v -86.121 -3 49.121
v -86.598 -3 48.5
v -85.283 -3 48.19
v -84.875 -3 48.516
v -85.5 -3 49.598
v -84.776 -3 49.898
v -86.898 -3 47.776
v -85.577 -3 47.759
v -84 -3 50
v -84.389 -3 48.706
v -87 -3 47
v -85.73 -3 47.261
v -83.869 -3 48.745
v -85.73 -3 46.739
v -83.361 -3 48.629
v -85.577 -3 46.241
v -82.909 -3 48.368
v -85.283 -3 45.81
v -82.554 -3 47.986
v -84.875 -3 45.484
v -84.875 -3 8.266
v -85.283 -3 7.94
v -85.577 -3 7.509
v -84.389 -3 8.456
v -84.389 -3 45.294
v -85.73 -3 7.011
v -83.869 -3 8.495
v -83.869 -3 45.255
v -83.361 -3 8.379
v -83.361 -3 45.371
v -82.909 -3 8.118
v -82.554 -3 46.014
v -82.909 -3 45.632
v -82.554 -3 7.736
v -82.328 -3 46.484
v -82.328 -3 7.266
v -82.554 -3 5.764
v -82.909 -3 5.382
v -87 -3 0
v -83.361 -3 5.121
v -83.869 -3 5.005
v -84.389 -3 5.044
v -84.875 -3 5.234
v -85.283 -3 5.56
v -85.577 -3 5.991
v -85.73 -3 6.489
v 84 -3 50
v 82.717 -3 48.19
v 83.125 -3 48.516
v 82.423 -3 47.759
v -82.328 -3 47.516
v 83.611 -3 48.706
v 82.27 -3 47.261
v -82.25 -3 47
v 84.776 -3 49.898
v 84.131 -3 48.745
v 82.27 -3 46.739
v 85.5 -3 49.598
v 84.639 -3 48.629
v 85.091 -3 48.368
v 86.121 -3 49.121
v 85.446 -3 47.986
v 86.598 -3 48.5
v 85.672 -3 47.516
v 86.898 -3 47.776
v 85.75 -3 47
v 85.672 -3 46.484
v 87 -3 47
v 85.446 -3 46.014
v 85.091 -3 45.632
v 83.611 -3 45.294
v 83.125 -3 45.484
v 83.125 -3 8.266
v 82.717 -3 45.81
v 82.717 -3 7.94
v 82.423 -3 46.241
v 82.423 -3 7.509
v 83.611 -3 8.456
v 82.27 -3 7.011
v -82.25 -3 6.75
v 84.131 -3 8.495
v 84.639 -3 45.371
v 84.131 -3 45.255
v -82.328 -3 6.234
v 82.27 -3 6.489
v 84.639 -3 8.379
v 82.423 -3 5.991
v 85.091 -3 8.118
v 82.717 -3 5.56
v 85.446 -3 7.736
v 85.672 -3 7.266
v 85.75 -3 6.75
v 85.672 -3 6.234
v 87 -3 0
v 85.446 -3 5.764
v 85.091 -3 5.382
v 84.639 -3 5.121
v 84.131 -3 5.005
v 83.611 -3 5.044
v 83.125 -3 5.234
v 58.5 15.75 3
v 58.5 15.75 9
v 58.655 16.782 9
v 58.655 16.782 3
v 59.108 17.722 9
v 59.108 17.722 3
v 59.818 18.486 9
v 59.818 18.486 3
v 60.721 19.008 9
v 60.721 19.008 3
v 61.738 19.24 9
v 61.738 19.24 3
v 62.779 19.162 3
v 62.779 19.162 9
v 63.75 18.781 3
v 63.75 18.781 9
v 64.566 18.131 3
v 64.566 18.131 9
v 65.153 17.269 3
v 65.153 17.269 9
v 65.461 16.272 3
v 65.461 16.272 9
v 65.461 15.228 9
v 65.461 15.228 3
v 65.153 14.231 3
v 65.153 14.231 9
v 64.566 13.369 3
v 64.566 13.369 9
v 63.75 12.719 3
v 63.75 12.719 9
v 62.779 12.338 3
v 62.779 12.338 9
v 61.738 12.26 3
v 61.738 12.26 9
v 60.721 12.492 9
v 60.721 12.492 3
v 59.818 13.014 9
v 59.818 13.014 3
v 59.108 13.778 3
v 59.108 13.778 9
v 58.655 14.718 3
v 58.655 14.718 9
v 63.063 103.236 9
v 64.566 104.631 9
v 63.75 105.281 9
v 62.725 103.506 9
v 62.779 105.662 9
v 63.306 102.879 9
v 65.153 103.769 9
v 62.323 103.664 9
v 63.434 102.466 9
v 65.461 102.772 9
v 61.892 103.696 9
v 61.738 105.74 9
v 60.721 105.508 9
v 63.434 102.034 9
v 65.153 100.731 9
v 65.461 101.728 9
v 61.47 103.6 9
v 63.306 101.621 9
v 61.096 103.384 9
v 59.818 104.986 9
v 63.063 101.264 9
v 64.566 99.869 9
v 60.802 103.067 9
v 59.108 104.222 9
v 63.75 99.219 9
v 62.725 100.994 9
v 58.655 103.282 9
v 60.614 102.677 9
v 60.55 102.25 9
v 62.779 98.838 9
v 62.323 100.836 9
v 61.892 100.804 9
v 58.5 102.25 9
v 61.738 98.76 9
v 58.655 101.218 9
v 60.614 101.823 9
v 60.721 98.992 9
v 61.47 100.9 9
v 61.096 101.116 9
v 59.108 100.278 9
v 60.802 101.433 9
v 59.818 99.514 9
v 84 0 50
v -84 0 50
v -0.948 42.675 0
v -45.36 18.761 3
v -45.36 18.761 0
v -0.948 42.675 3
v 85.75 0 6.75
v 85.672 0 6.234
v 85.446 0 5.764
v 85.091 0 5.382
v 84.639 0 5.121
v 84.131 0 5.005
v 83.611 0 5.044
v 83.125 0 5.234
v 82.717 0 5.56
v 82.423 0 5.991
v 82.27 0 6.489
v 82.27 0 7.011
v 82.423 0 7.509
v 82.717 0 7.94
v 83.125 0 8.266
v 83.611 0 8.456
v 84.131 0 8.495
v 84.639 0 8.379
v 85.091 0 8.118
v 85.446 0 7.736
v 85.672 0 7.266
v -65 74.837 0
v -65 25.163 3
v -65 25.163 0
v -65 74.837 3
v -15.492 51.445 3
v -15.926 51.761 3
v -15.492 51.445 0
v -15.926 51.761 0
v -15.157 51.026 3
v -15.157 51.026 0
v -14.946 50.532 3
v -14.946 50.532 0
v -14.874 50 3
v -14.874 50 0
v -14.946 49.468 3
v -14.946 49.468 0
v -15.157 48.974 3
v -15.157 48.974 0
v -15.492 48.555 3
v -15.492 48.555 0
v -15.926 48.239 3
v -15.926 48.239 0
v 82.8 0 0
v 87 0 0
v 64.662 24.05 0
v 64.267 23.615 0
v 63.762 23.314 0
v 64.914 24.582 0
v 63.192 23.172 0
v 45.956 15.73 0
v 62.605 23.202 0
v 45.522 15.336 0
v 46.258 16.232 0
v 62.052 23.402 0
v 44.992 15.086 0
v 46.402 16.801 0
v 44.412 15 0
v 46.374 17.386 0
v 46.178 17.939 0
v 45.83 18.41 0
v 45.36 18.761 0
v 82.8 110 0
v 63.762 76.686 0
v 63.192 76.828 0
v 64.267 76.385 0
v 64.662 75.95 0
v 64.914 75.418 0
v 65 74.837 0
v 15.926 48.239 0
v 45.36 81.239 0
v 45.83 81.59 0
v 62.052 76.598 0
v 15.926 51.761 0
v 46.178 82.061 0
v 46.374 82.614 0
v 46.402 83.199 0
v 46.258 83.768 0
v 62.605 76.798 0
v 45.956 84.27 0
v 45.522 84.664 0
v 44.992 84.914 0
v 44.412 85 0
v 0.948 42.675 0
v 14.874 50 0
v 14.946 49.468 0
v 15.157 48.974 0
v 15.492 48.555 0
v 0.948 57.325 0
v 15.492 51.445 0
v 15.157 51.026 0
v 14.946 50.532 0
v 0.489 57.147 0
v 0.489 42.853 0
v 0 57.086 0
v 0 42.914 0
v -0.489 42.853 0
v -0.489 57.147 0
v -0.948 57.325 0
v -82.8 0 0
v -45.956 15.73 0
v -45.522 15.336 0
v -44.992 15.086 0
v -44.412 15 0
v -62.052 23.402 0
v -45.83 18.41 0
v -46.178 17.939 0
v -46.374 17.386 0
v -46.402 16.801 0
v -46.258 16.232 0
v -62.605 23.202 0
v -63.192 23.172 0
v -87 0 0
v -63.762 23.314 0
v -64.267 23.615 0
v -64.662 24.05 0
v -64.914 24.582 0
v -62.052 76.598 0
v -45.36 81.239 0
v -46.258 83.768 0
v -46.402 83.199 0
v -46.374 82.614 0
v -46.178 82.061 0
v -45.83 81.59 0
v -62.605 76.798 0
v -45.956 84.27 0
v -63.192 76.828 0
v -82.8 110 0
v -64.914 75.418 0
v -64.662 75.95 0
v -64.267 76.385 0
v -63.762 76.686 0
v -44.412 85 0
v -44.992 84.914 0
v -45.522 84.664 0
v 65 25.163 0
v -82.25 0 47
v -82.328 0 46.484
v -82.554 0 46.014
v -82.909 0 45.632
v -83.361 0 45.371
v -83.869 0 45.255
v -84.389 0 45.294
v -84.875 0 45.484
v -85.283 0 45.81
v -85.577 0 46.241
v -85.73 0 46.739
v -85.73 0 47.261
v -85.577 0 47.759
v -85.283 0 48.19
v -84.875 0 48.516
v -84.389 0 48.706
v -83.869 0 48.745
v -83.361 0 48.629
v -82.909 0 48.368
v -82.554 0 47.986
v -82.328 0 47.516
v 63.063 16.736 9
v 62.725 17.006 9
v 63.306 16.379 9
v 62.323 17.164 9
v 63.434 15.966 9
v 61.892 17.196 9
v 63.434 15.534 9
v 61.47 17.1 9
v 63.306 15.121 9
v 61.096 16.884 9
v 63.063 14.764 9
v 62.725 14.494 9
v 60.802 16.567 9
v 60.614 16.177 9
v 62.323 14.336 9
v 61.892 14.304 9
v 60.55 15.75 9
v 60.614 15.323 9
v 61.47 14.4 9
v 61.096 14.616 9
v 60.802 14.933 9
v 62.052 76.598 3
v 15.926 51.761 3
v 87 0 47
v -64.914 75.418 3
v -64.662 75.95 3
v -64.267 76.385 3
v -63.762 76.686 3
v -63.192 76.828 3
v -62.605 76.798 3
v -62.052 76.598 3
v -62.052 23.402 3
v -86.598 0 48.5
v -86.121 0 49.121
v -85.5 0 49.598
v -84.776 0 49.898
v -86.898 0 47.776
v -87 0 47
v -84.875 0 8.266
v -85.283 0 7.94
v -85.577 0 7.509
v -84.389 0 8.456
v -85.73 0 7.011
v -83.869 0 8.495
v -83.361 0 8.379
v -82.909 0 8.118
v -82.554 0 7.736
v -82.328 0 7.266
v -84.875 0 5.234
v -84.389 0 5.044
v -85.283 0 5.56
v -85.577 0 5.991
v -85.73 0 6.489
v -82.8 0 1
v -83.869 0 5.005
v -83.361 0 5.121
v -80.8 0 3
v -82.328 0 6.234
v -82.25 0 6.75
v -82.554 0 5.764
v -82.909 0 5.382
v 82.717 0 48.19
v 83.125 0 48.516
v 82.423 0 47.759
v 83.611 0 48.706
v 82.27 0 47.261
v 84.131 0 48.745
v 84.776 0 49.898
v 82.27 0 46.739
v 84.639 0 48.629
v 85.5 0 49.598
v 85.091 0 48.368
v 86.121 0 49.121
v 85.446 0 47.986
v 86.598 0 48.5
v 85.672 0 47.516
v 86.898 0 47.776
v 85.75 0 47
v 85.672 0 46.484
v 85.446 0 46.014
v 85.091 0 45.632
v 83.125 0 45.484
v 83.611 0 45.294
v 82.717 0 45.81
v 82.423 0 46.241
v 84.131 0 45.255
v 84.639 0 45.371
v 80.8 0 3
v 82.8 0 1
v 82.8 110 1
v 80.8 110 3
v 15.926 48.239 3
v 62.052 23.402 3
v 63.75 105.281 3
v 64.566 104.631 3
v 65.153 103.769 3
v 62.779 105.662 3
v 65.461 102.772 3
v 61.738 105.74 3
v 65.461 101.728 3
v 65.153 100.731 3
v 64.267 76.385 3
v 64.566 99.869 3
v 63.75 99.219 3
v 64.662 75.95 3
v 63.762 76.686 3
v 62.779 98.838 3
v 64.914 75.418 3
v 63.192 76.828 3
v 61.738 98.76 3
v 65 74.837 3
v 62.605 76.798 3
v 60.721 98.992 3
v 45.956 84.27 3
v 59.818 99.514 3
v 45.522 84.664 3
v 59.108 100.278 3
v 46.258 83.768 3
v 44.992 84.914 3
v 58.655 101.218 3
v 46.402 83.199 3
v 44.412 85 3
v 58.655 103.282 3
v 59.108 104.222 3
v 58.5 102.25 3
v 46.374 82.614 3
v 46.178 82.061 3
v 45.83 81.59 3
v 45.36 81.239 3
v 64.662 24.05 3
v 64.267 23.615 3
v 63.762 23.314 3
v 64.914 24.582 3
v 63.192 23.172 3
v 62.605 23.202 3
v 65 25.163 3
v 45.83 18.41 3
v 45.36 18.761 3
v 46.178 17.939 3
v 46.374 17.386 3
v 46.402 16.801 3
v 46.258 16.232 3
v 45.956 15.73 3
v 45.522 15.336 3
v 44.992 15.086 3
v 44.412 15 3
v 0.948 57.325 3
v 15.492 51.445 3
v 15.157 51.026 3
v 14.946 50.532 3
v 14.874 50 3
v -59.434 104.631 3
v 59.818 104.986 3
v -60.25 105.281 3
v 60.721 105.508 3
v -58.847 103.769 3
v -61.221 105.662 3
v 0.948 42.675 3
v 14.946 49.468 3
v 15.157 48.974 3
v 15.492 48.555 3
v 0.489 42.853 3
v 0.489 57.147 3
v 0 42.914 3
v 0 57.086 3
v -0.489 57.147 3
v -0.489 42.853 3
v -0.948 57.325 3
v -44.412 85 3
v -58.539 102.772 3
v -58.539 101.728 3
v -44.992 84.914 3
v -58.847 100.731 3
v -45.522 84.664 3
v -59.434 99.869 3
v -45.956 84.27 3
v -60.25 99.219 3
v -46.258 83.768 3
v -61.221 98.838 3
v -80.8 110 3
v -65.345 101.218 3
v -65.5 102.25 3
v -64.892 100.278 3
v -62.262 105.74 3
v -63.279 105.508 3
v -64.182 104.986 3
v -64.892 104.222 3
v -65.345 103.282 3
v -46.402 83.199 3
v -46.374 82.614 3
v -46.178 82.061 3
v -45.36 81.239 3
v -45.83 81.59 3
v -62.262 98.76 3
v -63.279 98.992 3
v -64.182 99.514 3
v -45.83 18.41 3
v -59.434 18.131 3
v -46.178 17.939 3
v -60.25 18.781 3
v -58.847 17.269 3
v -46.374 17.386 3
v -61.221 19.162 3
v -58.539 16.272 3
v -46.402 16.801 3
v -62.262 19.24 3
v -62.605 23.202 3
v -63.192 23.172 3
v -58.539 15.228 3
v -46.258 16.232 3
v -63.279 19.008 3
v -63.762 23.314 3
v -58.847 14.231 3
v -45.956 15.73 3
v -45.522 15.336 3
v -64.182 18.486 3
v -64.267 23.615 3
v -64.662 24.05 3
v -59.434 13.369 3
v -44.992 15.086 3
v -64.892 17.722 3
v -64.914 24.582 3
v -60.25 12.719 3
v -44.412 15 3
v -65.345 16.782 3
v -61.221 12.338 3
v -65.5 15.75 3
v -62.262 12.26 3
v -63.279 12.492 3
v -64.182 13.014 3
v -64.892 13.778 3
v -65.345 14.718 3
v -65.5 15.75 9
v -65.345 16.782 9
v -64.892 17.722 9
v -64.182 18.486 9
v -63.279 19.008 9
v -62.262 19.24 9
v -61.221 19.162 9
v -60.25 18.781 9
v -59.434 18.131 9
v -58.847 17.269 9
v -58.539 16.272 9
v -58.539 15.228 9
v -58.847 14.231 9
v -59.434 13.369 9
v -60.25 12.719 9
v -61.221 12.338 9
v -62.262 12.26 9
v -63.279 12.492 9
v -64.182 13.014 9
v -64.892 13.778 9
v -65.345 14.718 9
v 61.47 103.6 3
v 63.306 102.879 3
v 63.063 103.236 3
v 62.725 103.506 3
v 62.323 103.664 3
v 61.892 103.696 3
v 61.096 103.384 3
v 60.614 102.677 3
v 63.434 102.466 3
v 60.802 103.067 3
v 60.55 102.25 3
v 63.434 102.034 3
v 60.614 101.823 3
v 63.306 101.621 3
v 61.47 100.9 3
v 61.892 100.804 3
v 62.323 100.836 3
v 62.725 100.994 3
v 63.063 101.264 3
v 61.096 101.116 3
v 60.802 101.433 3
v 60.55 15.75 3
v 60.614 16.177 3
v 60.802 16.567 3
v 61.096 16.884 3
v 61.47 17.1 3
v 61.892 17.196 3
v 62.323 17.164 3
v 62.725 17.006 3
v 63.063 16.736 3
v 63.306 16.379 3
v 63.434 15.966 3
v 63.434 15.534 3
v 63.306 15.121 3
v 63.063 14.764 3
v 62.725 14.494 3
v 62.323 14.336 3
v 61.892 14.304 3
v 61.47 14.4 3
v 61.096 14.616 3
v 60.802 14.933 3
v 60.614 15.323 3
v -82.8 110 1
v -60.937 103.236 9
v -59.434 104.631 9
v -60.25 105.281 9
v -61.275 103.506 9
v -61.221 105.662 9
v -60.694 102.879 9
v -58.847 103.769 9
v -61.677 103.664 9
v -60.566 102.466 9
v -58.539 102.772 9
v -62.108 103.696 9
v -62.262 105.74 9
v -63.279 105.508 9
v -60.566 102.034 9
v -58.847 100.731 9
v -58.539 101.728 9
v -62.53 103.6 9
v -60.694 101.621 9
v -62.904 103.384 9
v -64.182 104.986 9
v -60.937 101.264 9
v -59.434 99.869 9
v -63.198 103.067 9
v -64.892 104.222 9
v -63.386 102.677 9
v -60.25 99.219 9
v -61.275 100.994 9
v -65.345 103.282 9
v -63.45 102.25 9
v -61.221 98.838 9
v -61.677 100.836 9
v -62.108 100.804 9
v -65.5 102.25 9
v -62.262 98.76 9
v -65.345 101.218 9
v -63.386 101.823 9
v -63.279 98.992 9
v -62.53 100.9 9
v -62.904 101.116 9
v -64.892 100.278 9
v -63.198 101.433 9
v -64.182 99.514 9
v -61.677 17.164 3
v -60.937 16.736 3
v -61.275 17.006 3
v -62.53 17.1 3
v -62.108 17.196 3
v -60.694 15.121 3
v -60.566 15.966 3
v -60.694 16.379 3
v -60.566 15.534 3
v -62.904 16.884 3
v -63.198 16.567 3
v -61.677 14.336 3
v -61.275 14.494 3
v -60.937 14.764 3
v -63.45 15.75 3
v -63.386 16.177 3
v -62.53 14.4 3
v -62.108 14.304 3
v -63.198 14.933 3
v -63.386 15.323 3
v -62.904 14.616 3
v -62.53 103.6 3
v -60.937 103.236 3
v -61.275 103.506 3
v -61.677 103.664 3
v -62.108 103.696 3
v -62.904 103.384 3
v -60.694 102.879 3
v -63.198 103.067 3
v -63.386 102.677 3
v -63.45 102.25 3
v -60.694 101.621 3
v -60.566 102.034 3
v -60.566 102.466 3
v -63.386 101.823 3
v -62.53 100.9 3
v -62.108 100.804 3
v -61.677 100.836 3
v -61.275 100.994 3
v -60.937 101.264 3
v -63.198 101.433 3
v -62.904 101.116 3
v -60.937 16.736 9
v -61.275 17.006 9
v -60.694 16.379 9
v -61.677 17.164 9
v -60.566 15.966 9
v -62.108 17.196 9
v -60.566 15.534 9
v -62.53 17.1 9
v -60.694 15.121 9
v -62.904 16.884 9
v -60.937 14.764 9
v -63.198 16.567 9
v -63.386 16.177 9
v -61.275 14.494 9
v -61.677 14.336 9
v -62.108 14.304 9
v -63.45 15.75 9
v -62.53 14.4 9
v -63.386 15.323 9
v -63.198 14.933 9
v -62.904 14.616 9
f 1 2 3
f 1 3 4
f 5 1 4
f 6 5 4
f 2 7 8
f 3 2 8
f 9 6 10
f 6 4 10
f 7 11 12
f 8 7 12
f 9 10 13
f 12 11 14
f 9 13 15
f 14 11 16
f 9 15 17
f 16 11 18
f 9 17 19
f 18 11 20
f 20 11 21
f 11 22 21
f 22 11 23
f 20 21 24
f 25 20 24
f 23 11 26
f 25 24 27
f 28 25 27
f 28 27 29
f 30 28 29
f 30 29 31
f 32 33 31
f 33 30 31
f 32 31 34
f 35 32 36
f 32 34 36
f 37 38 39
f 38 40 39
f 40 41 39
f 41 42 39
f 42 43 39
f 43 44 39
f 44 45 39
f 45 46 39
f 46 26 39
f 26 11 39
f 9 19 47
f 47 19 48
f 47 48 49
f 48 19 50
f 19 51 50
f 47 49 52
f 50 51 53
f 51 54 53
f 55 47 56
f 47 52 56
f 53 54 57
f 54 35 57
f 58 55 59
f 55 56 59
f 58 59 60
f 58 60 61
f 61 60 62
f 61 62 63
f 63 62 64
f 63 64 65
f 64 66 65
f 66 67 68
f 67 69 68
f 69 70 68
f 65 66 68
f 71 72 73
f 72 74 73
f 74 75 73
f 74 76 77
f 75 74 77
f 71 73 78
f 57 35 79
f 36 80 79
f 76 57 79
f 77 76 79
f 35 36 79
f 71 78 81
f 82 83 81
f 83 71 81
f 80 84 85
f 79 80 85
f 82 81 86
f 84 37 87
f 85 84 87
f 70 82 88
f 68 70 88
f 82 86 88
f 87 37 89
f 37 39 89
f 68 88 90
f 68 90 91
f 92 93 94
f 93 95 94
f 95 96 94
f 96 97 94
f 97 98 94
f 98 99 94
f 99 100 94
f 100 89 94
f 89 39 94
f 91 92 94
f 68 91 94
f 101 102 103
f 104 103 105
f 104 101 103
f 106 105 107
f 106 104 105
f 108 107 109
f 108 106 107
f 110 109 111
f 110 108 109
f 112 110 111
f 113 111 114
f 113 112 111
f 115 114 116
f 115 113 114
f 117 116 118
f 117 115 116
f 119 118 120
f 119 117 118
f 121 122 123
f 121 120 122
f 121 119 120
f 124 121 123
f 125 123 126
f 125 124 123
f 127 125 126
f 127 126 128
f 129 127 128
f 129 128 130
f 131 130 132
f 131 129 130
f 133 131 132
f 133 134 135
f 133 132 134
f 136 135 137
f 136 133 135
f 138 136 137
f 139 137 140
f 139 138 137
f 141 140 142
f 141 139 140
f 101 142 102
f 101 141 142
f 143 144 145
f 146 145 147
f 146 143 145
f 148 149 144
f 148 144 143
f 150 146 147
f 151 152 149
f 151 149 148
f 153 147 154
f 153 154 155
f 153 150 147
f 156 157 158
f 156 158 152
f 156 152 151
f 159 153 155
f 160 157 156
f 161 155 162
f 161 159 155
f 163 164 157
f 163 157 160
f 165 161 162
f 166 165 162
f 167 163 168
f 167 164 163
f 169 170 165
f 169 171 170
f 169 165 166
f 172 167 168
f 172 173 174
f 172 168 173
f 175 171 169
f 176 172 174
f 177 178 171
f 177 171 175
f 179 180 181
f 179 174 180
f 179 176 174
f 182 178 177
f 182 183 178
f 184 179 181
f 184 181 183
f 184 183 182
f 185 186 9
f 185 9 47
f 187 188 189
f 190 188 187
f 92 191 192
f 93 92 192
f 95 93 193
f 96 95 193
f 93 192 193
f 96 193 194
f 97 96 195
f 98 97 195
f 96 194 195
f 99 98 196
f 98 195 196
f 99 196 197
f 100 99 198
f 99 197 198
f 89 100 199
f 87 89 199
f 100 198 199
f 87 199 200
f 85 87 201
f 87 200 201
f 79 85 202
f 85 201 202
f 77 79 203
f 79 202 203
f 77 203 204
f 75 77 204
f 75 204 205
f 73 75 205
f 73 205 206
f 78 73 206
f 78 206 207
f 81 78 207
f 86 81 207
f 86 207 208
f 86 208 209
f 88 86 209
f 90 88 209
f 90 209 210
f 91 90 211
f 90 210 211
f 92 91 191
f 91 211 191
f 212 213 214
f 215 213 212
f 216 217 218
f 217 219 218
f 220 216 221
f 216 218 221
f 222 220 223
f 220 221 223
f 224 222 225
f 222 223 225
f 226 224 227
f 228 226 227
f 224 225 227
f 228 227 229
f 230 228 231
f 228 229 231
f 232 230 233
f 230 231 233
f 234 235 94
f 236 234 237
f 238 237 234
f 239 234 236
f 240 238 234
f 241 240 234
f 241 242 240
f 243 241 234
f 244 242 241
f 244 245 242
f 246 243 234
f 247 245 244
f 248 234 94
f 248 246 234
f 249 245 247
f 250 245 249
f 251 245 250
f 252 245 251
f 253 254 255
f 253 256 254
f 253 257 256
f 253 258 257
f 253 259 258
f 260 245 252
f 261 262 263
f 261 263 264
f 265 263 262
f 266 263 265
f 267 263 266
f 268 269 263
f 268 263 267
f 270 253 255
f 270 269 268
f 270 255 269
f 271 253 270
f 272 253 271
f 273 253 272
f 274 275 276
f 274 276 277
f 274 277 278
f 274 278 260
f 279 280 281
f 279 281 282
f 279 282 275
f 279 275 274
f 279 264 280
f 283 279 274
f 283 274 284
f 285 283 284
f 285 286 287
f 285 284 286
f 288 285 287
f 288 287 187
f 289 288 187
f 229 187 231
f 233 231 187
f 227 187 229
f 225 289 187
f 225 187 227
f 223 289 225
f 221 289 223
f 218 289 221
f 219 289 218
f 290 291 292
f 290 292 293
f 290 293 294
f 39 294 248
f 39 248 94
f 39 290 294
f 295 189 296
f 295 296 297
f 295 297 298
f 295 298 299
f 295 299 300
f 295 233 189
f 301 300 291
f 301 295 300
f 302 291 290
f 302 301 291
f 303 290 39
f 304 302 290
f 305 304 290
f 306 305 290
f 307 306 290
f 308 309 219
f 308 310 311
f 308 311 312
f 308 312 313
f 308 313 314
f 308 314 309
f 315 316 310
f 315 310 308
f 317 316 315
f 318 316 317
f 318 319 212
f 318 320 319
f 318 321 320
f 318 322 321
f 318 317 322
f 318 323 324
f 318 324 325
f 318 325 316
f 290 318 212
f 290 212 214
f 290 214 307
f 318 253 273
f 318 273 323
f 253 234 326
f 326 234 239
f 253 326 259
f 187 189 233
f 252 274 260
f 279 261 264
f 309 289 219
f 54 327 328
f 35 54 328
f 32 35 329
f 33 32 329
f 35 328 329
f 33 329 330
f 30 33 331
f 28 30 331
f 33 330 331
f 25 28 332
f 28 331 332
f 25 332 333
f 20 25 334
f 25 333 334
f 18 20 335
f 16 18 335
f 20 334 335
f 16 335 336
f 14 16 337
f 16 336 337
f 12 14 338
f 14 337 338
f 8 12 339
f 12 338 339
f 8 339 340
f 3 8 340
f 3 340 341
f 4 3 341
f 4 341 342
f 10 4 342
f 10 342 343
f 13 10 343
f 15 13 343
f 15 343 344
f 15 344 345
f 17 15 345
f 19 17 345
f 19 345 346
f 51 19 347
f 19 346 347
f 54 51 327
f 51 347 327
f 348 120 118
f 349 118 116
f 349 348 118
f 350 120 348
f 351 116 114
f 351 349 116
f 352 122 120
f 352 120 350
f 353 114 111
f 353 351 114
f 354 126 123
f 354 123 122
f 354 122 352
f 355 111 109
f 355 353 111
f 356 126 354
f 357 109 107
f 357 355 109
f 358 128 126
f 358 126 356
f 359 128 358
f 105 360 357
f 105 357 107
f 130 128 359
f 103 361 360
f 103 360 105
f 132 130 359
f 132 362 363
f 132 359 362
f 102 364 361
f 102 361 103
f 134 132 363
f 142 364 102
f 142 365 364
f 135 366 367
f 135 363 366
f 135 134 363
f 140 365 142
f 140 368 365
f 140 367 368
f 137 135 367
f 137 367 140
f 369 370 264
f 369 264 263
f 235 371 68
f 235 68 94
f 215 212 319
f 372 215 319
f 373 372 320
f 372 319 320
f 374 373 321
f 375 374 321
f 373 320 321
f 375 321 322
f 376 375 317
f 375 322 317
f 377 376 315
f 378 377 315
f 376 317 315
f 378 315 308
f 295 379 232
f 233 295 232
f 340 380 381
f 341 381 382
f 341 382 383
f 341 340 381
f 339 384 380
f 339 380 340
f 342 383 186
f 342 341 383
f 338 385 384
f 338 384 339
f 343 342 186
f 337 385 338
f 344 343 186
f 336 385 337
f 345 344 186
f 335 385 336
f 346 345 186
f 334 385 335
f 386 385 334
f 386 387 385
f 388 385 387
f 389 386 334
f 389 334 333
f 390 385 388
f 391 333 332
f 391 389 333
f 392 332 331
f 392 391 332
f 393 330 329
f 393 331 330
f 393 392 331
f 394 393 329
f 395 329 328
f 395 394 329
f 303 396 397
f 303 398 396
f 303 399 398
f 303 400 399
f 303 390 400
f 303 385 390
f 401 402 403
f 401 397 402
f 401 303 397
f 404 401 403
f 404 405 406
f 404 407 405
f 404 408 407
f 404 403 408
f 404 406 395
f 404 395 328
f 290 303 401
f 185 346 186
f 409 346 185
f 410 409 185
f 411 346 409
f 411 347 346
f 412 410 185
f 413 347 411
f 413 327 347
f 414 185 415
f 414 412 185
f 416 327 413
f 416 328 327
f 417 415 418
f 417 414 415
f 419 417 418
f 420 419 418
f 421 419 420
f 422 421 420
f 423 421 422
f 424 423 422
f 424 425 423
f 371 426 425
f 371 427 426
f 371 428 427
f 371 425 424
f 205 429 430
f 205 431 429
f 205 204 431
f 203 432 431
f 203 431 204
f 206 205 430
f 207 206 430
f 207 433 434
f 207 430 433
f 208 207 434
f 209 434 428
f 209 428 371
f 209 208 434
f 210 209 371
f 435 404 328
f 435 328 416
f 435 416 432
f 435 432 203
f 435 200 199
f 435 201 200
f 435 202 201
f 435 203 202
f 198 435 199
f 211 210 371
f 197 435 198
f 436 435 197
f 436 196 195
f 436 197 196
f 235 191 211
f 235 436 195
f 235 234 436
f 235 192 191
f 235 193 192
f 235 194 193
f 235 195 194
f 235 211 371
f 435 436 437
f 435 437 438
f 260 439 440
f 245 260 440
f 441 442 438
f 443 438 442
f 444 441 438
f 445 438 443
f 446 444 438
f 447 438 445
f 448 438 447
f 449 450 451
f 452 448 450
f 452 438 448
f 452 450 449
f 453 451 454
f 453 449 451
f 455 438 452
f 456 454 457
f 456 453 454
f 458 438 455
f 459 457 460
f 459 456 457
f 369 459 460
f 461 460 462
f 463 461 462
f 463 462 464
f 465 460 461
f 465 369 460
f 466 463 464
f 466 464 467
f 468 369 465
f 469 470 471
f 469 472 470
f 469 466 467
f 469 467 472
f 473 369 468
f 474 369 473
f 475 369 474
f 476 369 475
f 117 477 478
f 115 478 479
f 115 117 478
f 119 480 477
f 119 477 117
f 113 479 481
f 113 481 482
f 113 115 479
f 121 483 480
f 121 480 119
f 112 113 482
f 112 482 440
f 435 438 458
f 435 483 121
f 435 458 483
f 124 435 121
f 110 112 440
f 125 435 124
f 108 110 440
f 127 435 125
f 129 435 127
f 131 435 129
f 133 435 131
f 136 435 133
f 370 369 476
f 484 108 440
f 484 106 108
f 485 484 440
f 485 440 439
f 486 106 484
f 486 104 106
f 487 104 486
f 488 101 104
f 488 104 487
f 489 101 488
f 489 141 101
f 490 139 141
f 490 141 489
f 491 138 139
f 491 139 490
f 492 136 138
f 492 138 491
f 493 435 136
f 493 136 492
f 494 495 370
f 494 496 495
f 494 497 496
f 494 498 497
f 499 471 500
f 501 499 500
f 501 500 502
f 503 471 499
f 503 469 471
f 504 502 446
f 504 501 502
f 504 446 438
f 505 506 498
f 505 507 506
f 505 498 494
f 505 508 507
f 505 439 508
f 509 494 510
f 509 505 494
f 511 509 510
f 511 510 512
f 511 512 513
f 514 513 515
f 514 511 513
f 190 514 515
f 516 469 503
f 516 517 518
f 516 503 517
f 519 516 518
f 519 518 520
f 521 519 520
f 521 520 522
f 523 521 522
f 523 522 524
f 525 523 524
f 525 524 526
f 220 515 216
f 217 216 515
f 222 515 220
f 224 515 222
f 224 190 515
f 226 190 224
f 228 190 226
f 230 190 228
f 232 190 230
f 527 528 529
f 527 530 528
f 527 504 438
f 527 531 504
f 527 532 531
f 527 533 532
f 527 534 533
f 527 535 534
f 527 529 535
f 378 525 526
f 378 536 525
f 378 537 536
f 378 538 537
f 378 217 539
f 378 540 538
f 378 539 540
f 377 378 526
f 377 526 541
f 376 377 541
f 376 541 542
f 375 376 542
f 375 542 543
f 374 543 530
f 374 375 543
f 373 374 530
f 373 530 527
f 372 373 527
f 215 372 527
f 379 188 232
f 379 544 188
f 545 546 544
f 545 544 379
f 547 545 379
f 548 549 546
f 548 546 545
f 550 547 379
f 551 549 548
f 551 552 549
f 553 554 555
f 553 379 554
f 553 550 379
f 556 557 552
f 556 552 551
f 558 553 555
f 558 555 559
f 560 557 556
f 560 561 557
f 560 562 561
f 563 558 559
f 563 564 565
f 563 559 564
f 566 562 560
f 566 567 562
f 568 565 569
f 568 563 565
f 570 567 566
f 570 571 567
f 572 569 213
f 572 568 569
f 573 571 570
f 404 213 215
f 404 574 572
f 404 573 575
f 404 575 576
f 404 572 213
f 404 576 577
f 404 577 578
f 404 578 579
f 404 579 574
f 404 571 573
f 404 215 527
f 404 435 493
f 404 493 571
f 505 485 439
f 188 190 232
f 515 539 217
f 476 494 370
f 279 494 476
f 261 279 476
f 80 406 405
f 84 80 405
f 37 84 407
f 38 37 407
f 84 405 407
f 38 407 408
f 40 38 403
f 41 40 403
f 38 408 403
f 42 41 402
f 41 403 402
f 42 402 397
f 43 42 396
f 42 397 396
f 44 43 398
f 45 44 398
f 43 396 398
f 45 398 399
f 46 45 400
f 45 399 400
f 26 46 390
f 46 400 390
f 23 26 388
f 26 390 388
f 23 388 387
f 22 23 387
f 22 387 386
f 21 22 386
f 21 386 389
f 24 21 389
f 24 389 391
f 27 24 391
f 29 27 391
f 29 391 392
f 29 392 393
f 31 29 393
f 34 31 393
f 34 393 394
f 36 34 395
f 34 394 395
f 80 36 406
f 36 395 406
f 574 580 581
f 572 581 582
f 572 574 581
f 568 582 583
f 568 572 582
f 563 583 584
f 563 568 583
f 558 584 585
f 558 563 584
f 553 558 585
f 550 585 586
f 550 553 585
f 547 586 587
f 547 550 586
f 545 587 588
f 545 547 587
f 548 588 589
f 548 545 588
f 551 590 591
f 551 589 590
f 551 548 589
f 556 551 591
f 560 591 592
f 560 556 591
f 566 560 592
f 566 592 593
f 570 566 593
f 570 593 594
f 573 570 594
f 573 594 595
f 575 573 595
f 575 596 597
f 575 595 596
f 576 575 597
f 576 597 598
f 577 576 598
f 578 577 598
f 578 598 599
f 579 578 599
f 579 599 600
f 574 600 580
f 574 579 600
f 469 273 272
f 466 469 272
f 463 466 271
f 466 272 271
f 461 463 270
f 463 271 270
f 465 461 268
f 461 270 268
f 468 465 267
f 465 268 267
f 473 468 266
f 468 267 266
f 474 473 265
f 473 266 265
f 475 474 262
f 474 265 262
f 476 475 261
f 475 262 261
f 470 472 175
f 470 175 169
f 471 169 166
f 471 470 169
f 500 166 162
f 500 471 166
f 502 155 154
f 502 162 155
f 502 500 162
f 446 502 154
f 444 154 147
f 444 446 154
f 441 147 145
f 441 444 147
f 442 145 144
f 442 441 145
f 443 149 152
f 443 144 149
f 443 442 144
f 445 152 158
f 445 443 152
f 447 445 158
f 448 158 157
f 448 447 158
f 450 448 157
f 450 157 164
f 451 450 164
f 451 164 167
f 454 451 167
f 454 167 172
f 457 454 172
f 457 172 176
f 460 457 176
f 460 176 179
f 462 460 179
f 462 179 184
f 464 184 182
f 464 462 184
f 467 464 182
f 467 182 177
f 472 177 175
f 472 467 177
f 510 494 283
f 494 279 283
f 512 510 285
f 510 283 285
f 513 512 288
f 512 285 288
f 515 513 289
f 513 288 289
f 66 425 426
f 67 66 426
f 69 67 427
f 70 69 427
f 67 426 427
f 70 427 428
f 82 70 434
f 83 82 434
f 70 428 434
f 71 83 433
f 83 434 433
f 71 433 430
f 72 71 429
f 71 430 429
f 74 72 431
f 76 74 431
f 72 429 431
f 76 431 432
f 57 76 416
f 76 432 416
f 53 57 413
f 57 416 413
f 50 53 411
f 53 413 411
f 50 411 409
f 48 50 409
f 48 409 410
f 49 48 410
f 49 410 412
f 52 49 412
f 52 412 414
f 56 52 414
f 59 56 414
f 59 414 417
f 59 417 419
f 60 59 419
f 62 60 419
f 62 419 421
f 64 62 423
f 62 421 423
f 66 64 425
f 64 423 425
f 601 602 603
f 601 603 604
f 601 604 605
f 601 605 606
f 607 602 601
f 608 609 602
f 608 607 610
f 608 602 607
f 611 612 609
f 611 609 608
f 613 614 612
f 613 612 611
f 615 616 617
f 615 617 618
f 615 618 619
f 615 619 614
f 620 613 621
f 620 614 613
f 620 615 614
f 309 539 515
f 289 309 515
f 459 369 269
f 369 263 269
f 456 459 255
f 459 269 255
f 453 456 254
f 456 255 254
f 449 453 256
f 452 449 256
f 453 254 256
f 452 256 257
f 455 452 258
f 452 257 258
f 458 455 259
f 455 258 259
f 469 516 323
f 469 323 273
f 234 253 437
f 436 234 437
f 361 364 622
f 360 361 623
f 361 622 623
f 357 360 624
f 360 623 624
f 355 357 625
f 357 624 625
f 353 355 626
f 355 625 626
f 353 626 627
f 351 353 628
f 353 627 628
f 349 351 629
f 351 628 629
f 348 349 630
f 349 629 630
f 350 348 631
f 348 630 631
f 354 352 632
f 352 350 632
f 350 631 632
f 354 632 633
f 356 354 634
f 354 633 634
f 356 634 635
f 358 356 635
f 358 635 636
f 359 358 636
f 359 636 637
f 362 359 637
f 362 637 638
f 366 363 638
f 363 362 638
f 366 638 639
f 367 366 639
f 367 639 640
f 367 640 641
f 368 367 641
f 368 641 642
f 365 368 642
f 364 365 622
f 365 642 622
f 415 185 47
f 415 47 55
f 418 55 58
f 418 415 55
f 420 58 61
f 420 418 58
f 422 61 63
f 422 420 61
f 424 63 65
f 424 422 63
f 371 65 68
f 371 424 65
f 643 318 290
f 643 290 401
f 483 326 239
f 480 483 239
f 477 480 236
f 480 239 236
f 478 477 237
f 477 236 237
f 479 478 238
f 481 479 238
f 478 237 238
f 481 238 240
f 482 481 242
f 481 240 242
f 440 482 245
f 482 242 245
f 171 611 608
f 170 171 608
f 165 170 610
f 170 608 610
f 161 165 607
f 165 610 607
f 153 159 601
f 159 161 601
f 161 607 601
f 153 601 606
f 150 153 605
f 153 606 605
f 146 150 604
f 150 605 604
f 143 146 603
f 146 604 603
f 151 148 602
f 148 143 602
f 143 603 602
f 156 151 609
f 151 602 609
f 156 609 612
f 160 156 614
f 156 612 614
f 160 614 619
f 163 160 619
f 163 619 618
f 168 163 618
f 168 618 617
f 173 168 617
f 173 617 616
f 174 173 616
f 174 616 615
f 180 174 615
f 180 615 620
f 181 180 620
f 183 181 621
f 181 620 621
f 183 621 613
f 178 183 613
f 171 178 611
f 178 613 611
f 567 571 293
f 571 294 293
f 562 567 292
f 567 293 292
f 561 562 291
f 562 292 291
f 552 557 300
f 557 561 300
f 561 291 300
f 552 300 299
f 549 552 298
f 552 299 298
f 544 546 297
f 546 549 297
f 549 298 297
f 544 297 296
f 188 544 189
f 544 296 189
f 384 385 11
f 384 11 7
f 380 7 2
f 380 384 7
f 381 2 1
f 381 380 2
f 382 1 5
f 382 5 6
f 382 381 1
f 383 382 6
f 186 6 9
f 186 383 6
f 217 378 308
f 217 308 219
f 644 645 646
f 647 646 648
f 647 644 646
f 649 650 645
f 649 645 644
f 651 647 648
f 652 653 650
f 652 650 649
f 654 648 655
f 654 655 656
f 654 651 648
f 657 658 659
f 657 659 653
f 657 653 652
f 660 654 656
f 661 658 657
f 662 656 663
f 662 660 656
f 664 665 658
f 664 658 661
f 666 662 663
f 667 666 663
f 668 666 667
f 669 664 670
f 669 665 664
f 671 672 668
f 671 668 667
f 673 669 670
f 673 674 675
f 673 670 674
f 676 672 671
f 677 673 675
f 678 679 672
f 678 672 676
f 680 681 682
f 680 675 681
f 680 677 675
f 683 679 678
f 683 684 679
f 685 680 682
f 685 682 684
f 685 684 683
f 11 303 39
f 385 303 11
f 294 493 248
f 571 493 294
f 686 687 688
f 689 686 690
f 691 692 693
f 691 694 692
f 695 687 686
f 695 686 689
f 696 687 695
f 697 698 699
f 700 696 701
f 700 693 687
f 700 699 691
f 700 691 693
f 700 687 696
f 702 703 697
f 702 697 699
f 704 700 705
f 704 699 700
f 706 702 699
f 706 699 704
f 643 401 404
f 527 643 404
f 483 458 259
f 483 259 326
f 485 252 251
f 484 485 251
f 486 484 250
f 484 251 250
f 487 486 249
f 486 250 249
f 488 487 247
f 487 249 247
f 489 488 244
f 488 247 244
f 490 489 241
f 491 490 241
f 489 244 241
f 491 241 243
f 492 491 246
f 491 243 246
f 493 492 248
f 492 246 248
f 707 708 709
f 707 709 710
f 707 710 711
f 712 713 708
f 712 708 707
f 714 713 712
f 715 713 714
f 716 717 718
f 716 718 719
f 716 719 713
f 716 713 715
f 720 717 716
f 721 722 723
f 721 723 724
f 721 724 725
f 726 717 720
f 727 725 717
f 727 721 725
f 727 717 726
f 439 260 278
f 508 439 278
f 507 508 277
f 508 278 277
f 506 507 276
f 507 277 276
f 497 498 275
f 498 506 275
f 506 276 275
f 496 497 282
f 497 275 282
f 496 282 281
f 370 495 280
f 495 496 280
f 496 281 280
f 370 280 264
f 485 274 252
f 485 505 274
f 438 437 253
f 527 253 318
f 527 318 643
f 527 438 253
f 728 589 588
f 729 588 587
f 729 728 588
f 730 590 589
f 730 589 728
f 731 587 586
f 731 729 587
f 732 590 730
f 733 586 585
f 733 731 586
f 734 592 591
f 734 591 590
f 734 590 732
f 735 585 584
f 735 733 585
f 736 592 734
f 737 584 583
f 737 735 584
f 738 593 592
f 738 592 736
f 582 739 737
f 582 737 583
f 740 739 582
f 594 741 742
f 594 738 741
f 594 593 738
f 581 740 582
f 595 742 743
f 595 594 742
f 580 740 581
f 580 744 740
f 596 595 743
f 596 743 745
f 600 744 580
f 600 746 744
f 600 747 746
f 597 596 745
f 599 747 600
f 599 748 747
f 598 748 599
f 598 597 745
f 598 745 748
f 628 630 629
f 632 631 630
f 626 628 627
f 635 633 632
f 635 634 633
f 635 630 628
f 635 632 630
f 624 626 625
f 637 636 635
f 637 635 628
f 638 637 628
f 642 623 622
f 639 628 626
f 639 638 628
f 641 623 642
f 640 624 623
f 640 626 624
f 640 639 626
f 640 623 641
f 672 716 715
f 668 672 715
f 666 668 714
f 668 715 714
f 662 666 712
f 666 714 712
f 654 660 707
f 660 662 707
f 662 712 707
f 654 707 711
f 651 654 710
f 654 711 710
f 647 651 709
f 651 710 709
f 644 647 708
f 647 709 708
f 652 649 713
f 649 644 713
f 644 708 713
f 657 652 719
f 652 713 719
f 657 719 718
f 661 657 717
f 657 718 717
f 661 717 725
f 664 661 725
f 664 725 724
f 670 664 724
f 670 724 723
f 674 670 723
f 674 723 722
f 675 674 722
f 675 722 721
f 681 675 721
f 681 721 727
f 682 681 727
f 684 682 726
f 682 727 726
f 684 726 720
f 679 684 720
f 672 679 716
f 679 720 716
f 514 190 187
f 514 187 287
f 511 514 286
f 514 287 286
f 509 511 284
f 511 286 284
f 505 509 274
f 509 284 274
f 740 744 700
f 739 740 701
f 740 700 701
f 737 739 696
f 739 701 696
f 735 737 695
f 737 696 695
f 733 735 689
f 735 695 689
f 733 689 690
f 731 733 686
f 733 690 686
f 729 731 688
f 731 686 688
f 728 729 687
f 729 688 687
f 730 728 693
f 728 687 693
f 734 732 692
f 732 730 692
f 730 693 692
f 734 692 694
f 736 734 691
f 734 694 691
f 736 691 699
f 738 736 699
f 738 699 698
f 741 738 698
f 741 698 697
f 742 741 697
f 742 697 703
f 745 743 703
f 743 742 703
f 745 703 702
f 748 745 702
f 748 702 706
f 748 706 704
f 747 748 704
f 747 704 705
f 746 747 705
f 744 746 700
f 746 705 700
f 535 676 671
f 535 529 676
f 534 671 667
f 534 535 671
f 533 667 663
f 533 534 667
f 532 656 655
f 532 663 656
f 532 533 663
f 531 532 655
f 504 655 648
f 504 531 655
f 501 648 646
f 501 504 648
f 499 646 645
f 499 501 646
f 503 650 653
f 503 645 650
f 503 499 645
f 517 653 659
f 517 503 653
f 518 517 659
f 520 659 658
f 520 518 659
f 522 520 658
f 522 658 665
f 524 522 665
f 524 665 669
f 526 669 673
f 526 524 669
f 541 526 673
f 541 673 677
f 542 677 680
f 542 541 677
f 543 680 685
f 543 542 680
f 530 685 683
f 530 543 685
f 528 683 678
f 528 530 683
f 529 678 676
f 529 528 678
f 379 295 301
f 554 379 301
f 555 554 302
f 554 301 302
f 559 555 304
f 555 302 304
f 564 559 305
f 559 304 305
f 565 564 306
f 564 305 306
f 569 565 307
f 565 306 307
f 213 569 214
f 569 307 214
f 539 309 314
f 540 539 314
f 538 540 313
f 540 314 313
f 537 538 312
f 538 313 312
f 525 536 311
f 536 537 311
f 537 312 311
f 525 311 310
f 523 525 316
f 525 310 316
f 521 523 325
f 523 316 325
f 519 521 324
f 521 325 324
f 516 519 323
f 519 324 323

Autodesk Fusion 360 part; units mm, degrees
sketch "Sketch13" plane through (0, 0, 0) normal (0, 0, -1) x (1, 0, 0)
  line L0 (0.9482, -57.3251) -> (45.3598, -81.2391)
  arc A0 (44.4116, -85) -> (45.3598, -81.2391) centre (44.4116, -83) ccw
  line L1 (44.4116, -85) -> (-44.4116, -85)
  arc A1 (-45.3598, -81.2391) -> (-44.4116, -85) centre (-44.4116, -83) ccw
  line L2 (-45.3598, -81.2391) -> (-0.9482, -57.3251)
  arc A2 (0.9482, -57.3251) -> (-0.9482, -57.3251) centre (0, -59.086) ccw
  line L3 (65, -25.163) -> (65, -74.837)
  arc A3 (62.0518, -76.598) -> (65, -74.837) centre (63, -74.837) ccw
  line L4 (62.0518, -76.598) -> (15.9259, -51.7609)
  arc A4 (15.9259, -48.2391) -> (15.9259, -51.7609) centre (16.8741, -50) ccw
  line L5 (15.9259, -48.2391) -> (62.0518, -23.402)
  arc A5 (65, -25.163) -> (62.0518, -23.402) centre (63, -25.163) ccw
  line L6 (-62.0518, -23.402) -> (-15.9259, -48.2391)
  arc A6 (-15.9259, -51.7609) -> (-15.9259, -48.2391) centre (-16.8741, -50) ccw
  line L7 (-15.9259, -51.7609) -> (-62.0518, -76.598)
  arc A7 (-65, -74.837) -> (-62.0518, -76.598) centre (-63, -74.837) ccw
  line L8 (-65, -74.837) -> (-65, -25.163)
  arc A8 (-62.0518, -23.402) -> (-65, -25.163) centre (-63, -25.163) ccw
  line L9 (45.3598, -18.7609) -> (0.9482, -42.6749)
  arc A9 (-0.9482, -42.6749) -> (0.9482, -42.6749) centre (0, -40.914) ccw
  line L10 (-0.9482, -42.6749) -> (-45.3598, -18.7609)
  arc A10 (-44.4116, -15) -> (-45.3598, -18.7609) centre (-44.4116, -17) ccw
  line L11 (-44.4116, -15) -> (44.4116, -15)
  arc A11 (45.3598, -18.7609) -> (44.4116, -15) centre (44.4116, -17) ccw
  line L12 (82.8, 0) -> (87, 0)
  line L13 (87, 0) -> (87, 3)
  line L14 (87, 3) -> (-87, 3)
  line L15 (-87, 3) -> (-87, 0)
  line L16 (-87, 0) -> (-82.8, 0)
  line L17 (-82.8, 0) -> (-82.8, -110)
  line L18 (-82.8, -110) -> (82.8, -110)
  line L19 (82.8, -110) -> (82.8, 0)
  line L20 (65.8, -110) -> (50.8, -110)
  line L21 (50.8, -110) -> (50.8, -60)
  line L22 (50.8, -60) -> (65.8, -60)
  line L23 (65.8, -60) -> (65.8, -110)
  line L24 (-38.8, -110) -> (-53.8, -110)
  line L25 (-53.8, -110) -> (-53.8, -2)
  line L26 (-53.8, -2) -> (-38.8, -2)
  line L27 (-38.8, -2) -> (-38.8, -110)
  dimension "d1" = 15
  dimension "d2" = 15
  dimension "d3" = 17
  dimension "d4" = 50
  dimension "d5" = 108
  dimension "d6" = 29
sketch "Sketch14" plane through (0, 0, 0) normal (0, 0, -1) x (1, 0, 0)
  line L0 (-62.0518, -23.402) -> (-15.9259, -48.2391)
  arc A0 (-15.9259, -51.7609) -> (-15.9259, -48.2391) centre (-16.8741, -50) ccw
  line L1 (-15.9259, -51.7609) -> (-62.0518, -76.598)
  arc A1 (-65, -74.837) -> (-62.0518, -76.598) centre (-63, -74.837) ccw
  line L2 (-65, -74.837) -> (-65, -25.163)
  arc A2 (-62.0518, -23.402) -> (-65, -25.163) centre (-63, -25.163) ccw
  line L3 (-0.9482, -42.6749) -> (-45.3598, -18.7609)
  arc A3 (-44.4116, -15) -> (-45.3598, -18.7609) centre (-44.4116, -17) ccw
  line L4 (-44.4116, -15) -> (44.4116, -15)
  arc A4 (45.3598, -18.7609) -> (44.4116, -15) centre (44.4116, -17) ccw
  line L5 (45.3598, -18.7609) -> (0.9482, -42.6749)
  arc A5 (-0.9482, -42.6749) -> (0.9482, -42.6749) centre (0, -40.914) ccw
  line L6 (-82.8, -110) -> (82.8, -110)
  line L7 (82.8, -110) -> (82.8, 0)
  line L8 (82.8, 0) -> (87, 0)
  line L9 (87, 0) -> (87, 3)
  line L10 (87, 3) -> (-87, 3)
  line L11 (-87, 3) -> (-87, 0)
  line L12 (-87, 0) -> (-82.8, 0)
  line L13 (-82.8, 0) -> (-82.8, -110)
  line L14 (44.4116, -85) -> (-44.4116, -85)
  arc A6 (-45.3598, -81.2391) -> (-44.4116, -85) centre (-44.4116, -83) ccw
  line L15 (-45.3598, -81.2391) -> (-0.9482, -57.3251)
  arc A7 (0.9482, -57.3251) -> (-0.9482, -57.3251) centre (0, -59.086) ccw
  line L16 (0.9482, -57.3251) -> (45.3598, -81.2391)
  arc A8 (44.4116, -85) -> (45.3598, -81.2391) centre (44.4116, -83) ccw
  line L17 (62.0518, -76.598) -> (15.9259, -51.7609)
  arc A9 (15.9259, -48.2391) -> (15.9259, -51.7609) centre (16.8741, -50) ccw
  line L18 (15.9259, -48.2391) -> (62.0518, -23.402)
  arc A10 (65, -25.163) -> (62.0518, -23.402) centre (63, -25.163) ccw
  line L19 (65, -25.163) -> (65, -74.837)
  arc A11 (62.0518, -76.598) -> (65, -74.837) centre (63, -74.837) ccw
  line L20 (65.3, -110) -> (51.3, -110)
  line L21 (51.3, -110) -> (51.3, -61)
  line L22 (51.3, -61) -> (65.3, -61)
  line L23 (65.3, -61) -> (65.3, -110)
  line L24 (-39.3, -110) -> (-53.3, -110)
  line L25 (-53.3, -110) -> (-53.3, -3)
  line L26 (-53.3, -3) -> (-39.3, -3)
  line L27 (-39.3, -3) -> (-39.3, -110)
  dimension "d7" = 107
  dimension "d8" = 49
  dimension "d9" = 14
  dimension "d10" = 14
  dimension "d11" = 29.5
  dimension "d12" = 17.5
sketch "Sketch1" plane through (0, 0, 0) normal (0, 1, 0) x (1, 0, 0)
  line L0 (-75, 0) -> (75, 0) construction
  line L1 (-87, -50) -> (87, -50)
  line L2 (87, -50) -> (87, 0)
  line L3 (87, 0) -> (-87, 0)
  line L4 (-87, 0) -> (-87, -50)
  line L5 (0, -100) -> (0, 100) construction
  circle A0 centre (-84, -47) radius 1.75
  circle A1 centre (-84, -47) radius 3
  circle A2 centre (-84, -6.75) radius 1.75
  circle A3 centre (-84, -6.75) radius 3
  circle A4 centre (84, -47) radius 1.75
  circle A5 centre (84, -47) radius 3
  circle A6 centre (84, -6.75) radius 1.75
  circle A7 centre (84, -6.75) radius 3
  line L6 (-87, -5) -> (87, -5) construction
  dimension "d99_1" = 150
  dimension "d100_1" = 174
  dimension "d101_1" = 50
  dimension "d102_1" = 200
  dimension "d103_1" = 3.5
  dimension "d104_1" = 6
  dimension "d105_1" = 3.5
  dimension "d106_1" = 6
  dimension "d107_1" = 3.5
  dimension "d108_1" = 6
  dimension "d109_1" = 3.5
  dimension "d110_1" = 6
  dimension "d111_1" = 5
extrude "Extrude1" add sketch "Sketch1" against normal blind 3 contours L1 L4 A1 | A7 | A3 | L1 L2 L3 L4 A1 A5 | A1 | L1 L2 A5 | A5
sketch "Sketch2" plane through (0, 0, 0) normal (0, 1, 0) x (-1, 0, 0)
  circle A0 centre (-84, 6.75) radius 1.75
  circle A1 centre (-84, 47) radius 1.75
  circle A2 centre (84, 6.75) radius 1.75
  circle A3 centre (84, 47) radius 1.75
  line L0 (87, 50) -> (-87, 50)
  line L1 (-87, 50) -> (-87, 0)
  line L2 (-87, 0) -> (87, 0)
  line L3 (87, 0) -> (87, 50)
  line L4 (-87, 3) -> (87, 3)
  line L5 (-82.8, 0) -> (-82.8, 1)
  line L6 (-82.8, 1) -> (-80.8, 3)
  line L7 (-82.8, 1) -> (82.8, 1) construction
  line L8 (82.8, 0) -> (82.8, 1)
  line L9 (82.8, 1) -> (80.8, 3)
  line L10 (0, 70.9993) -> (0, -26.0281) construction
  line L11 (0, 100) -> (0, -100)
  point P0 (0, 1)
  dimension "d114_1" = 3
  dimension "d115_1" = 1
  dimension "d116_1" = 45
  dimension "d118_1" = 1
  dimension "d119_1" = 135
  dimension "d18" = 165.6
extrude "Extrude22" add sketch "Sketch2" along normal blind 8 contours L2 L4 L5 L6 L11 | L2 L4 L8 L9 L11
extrude "Extrude2" add sketch "Sketch2" along normal blind 110 contours L2 L4 L5 L6 L11 | L2 L4 L8 L9 L11
sketch "Sketch3" plane through (0, 0, 3) normal (0, 0, 1) x (-1, 0, 0)
  line L0 (80.8, 0) -> (-80.8, 0)
  line L1 (-80.8, 0) -> (-80.8, -110)
  line L2 (-80.8, -110) -> (80.8, -110)
  line L3 (80.8, -110) -> (80.8, 0)
  line L4 (0, 0) -> (0, -110) construction
  line L5 (82.8, 0, -3) -> (82.8, -110, -3) construction
  line L6 (82.8, -55, -3) -> (62.187, -54.4724, -3.177) construction
  line L7 (-82.8, 0, -2) -> (-82.8, -110, -2) construction
  line L8 (62.187, -54.4724, -3.177) -> (-82.8, -55, -2) construction
  circle A0 centre (62, -15.75) radius 1.45
  circle A1 centre (62, -15.75) radius 3.5
  circle A2 centre (62, -102.25) radius 1.45
  circle A3 centre (62, -102.25) radius 3.5
  circle A4 centre (-62, -15.75) radius 1.45
  circle A5 centre (-62, -15.75) radius 3.5
  circle A6 centre (-62, -102.25) radius 1.45
  circle A7 centre (-62, -102.25) radius 3.5
  line L9 (65, -85) -> (-65, -85)
  line L10 (-65, -85) -> (-65, -15)
  line L11 (-65, -15) -> (65, -15)
  line L12 (65, -15) -> (65, -85)
  line L13 (65, -15) -> (-65, -85) construction
  line L14 (65, -85) -> (-65, -15) construction
  line L15 (65, -78.1855) -> (12.6556, -50)
  line L16 (0, -43.1855) -> (-52.3444, -15)
  line L17 (52.3444, -85) -> (0, -56.8145)
  line L18 (-12.6556, -50) -> (-65, -21.8145)
  line L19 (65, -21.8145) -> (12.6556, -50)
  line L20 (0, -56.8145) -> (-52.3444, -85)
  line L21 (52.3444, -15) -> (0, -43.1855)
  line L22 (-12.6556, -50) -> (-65, -78.1855)
  line L23 (73.5, 0) -> (-73.5, 0) construction
  line L24 (-73.5, 0) -> (-73.5, -95) construction
  line L25 (-73.5, -95) -> (73.5, -95) construction
  line L26 (73.5, -95) -> (73.5, 0) construction
  point P0 (0, -55)
  dimension "d124_1" = 2.9
  dimension "d125_1" = 7
  dimension "d126_1" = 2.9
  dimension "d127_1" = 7
  dimension "d128_1" = 2.9
  dimension "d129_1" = 7
  dimension "d130_1" = 2.9
  dimension "d131_1" = 7
  dimension "d132_1" = 86.5
  dimension "d133_1" = 124
  dimension "d134_1" = 15.75
  dimension "d149_1" = 130
  dimension "d150_1" = 70
  dimension "d154_1" = 6
  dimension "d31" = 147
  dimension "d32" = 95
  dimension "d33" = 6
  dimension "d34" = 15
  dimension "d35" = 6
  dimension "d175" = 86.5
extrude "Extrude6" cut sketch "Sketch3" against normal blind 3 contours L11 L16 L21 | L12 L15 L19 | L9 L17 L20 | L10 L18 L22
extrude "Extrude3" add sketch "Sketch3" along normal blind 6 contours A0 A1 L11 L12 | A0 A1 L11 L12 | A4 A5 L10 L11 | A4 A5 L10 L11 | A3 | A7
fillet "Fillet1" radius 2 12 edges at (-52.3444, 85, 1.5) (12.6556, 50, 1.5) (0, 56.8145, 1.5) (-12.6556, 50, 1.5) (0, 43.1855, 1.5) (52.3444, 85, 1.5) (-65, 21.8145, 1.5) (-65, 78.1855, 1.5) (65, 78.1855, 1.5) (65, 21.8145, 1.5) (52.3444, 15, 1.5) (-52.3444, 15, 1.5)
extrude "Extrude31" [suppressed]
chamfer "Chamfer38" [suppressed]
chamfer "Chamfer39" [suppressed]
chamfer "Chamfer40" [suppressed]
chamfer "Chamfer41" [suppressed]
chamfer "Chamfer42" [suppressed]
extrude "Extrude32" [suppressed]
chamfer "Chamfer43" [suppressed]
